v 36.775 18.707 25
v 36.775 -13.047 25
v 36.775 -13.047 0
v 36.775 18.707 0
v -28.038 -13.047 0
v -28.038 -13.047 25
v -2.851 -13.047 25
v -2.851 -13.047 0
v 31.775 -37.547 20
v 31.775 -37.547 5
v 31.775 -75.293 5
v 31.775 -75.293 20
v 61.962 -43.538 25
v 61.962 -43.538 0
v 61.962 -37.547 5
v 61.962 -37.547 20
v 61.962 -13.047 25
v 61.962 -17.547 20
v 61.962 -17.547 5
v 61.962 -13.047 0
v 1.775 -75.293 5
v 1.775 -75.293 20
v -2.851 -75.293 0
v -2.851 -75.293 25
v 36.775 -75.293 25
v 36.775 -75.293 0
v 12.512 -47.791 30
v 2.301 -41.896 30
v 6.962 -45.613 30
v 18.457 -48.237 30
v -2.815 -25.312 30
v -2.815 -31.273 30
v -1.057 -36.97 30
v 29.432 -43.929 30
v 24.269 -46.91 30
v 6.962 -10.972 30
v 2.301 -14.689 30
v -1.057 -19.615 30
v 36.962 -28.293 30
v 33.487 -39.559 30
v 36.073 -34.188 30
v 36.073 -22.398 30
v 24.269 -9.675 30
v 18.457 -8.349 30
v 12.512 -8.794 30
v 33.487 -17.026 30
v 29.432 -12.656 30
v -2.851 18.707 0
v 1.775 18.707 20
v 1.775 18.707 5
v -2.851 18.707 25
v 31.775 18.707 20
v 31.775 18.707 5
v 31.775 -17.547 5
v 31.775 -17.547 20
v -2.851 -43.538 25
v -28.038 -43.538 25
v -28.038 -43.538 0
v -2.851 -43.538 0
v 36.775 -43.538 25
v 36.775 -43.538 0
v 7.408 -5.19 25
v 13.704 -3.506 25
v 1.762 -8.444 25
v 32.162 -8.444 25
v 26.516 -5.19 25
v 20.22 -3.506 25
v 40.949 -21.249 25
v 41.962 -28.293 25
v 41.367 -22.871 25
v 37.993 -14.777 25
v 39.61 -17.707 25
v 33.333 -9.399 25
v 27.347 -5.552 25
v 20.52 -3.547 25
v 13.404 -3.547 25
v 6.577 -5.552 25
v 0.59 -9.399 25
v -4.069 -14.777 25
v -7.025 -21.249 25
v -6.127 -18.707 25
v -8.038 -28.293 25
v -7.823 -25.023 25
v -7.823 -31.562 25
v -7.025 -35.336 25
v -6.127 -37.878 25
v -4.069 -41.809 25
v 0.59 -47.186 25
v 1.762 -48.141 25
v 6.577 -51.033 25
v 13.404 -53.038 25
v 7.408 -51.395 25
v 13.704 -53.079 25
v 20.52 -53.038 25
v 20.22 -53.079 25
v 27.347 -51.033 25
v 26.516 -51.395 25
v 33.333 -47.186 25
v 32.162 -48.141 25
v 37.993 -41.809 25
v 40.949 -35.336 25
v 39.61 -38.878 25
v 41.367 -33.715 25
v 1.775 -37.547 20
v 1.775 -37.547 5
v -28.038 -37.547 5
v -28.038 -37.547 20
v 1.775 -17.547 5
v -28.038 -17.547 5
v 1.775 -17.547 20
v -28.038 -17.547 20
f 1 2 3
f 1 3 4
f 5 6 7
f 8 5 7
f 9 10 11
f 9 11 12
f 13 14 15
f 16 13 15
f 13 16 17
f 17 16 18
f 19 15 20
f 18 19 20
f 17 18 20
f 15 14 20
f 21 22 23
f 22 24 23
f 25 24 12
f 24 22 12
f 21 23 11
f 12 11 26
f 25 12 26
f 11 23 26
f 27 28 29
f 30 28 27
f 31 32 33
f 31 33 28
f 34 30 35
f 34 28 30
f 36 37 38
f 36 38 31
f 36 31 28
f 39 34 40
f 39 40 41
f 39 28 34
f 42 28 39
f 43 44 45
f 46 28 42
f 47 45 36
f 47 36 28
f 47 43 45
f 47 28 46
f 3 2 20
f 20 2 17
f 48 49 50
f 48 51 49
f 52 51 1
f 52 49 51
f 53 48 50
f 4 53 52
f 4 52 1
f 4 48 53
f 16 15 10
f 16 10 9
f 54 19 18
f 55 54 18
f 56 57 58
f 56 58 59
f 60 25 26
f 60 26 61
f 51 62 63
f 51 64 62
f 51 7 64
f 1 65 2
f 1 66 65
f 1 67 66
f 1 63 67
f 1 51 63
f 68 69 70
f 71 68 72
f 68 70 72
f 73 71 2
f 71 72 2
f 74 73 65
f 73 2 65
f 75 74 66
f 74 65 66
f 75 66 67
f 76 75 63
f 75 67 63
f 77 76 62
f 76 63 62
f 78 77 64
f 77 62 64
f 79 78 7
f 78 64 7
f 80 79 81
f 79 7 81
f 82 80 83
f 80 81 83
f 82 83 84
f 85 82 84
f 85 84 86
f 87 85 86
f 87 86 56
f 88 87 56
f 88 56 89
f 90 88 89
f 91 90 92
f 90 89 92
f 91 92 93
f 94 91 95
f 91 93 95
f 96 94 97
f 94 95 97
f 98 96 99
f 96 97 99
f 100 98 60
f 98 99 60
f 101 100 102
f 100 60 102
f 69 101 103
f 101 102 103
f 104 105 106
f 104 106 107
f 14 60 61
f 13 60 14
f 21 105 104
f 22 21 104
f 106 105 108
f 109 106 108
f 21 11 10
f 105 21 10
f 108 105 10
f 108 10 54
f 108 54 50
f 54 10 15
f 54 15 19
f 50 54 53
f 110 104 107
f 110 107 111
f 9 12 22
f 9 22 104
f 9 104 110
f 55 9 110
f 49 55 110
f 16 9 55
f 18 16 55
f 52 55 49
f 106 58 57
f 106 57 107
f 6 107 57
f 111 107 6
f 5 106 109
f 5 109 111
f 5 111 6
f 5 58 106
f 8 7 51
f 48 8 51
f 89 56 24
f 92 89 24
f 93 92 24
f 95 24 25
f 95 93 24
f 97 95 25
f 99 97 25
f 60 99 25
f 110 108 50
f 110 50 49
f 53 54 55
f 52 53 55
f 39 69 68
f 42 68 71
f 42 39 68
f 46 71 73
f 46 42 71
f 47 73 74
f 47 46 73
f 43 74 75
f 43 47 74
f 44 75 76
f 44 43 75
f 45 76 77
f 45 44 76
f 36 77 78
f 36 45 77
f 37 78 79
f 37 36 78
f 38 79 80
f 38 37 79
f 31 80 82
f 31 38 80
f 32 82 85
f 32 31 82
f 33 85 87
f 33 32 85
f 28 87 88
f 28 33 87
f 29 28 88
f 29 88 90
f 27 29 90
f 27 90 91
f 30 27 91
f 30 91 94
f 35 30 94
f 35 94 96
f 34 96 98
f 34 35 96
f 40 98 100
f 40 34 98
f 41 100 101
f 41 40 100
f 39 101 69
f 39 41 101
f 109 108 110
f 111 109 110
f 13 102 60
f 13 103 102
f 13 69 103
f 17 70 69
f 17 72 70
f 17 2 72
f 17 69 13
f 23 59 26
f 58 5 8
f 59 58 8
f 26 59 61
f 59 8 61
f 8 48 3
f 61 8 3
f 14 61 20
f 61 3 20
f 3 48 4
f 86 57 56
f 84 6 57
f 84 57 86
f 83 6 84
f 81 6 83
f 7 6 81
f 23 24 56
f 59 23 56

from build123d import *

# Parameters (mm, degrees)
F0_R      = 25
F1_DEPTH  = 30
F0_W      = 90
F0_H      = 94
F2_DEPTH  = 25
F3_SIZE   = 4.99999
F4_W      = 25.1866029114
F4_H      = 31.7543679761
F5_DEPTH  = 100
F6_DEPTH  = 100
F7_W      = 30
F7_H      = 15
F8_DEPTH  = 1000
F9_W      = 20
F9_H      = 15
F10_DEPTH = 100


# Not quite as in the source:
# - a fillet or chamfer is up to 0.001 mm smaller than in the source, because OpenCascade refuses the exact size


with BuildPart() as f1:
    # F0 (on Top) → F1 (new body)
    with BuildSketch(Plane.XY):
        with Locations((16.9619322568, -28.2926298678)):
            Circle(F0_R)
    extrude(amount=F1_DEPTH)

    # F0 (on Top) → F2 (join)
    with BuildSketch(Plane.XY):
        with Locations((16.9619322568, -28.2926298678)):
            Rectangle(F0_W, F0_H)
        with Locations((16.9619322568, -28.2926298678)):
            Circle(F0_R, mode=Mode.SUBTRACT)
    extrude(amount=F2_DEPTH)

    # F3 (size 5 in the source; OpenCascade refuses exactly that, so slightly less here)
    f3_edges = [f1.edges().sort_by_distance(p)[0] for p in [
        (-8.038068, -28.29263, 30),
    ]]
    chamfer(f3_edges, length=F3_SIZE)

    # F4 (on face) → F5 (cut)
    with BuildSketch(Plane.XY.offset(25)):
        with Locations((49.3686308011, 2.8301861442)):
            Rectangle(F4_W, F4_H)
    extrude(amount=-F5_DEPTH, mode=Mode.SUBTRACT)

    # F4 (on face) → F6 (cut)
    with BuildSketch(Plane.XY.offset(25)):
        with Locations((-15.4447662875, 2.8301861442)):
            Rectangle(F4_W, F4_H)
        with Locations((-15.4447662875, -59.4154458798)):
            Rectangle(F4_W, F4_H)
        with Locations((49.3686308011, -59.4154458798)):
            Rectangle(F4_W, F4_H)
    extrude(amount=-F6_DEPTH, mode=Mode.SUBTRACT)

    # F7 (on face) → F8 (cut)
    with BuildSketch(Plane(origin=(0, 18.7073701322, 0), x_dir=(-1, 0, 0), z_dir=(0, 1, 0))):
        with Locations((-16.7753293454, 12.5)):
            Rectangle(F7_W, F7_H)
    extrude(amount=-F8_DEPTH, mode=Mode.SUBTRACT)

    # F9 (on face) → F10 (cut)
    with BuildSketch(Plane.YZ.offset(61.9619322568)):
        with Locations((-27.5469978439, 12.5)):
            Rectangle(F9_W, F9_H)
    extrude(amount=-F10_DEPTH, mode=Mode.SUBTRACT)


solid = f1.part
